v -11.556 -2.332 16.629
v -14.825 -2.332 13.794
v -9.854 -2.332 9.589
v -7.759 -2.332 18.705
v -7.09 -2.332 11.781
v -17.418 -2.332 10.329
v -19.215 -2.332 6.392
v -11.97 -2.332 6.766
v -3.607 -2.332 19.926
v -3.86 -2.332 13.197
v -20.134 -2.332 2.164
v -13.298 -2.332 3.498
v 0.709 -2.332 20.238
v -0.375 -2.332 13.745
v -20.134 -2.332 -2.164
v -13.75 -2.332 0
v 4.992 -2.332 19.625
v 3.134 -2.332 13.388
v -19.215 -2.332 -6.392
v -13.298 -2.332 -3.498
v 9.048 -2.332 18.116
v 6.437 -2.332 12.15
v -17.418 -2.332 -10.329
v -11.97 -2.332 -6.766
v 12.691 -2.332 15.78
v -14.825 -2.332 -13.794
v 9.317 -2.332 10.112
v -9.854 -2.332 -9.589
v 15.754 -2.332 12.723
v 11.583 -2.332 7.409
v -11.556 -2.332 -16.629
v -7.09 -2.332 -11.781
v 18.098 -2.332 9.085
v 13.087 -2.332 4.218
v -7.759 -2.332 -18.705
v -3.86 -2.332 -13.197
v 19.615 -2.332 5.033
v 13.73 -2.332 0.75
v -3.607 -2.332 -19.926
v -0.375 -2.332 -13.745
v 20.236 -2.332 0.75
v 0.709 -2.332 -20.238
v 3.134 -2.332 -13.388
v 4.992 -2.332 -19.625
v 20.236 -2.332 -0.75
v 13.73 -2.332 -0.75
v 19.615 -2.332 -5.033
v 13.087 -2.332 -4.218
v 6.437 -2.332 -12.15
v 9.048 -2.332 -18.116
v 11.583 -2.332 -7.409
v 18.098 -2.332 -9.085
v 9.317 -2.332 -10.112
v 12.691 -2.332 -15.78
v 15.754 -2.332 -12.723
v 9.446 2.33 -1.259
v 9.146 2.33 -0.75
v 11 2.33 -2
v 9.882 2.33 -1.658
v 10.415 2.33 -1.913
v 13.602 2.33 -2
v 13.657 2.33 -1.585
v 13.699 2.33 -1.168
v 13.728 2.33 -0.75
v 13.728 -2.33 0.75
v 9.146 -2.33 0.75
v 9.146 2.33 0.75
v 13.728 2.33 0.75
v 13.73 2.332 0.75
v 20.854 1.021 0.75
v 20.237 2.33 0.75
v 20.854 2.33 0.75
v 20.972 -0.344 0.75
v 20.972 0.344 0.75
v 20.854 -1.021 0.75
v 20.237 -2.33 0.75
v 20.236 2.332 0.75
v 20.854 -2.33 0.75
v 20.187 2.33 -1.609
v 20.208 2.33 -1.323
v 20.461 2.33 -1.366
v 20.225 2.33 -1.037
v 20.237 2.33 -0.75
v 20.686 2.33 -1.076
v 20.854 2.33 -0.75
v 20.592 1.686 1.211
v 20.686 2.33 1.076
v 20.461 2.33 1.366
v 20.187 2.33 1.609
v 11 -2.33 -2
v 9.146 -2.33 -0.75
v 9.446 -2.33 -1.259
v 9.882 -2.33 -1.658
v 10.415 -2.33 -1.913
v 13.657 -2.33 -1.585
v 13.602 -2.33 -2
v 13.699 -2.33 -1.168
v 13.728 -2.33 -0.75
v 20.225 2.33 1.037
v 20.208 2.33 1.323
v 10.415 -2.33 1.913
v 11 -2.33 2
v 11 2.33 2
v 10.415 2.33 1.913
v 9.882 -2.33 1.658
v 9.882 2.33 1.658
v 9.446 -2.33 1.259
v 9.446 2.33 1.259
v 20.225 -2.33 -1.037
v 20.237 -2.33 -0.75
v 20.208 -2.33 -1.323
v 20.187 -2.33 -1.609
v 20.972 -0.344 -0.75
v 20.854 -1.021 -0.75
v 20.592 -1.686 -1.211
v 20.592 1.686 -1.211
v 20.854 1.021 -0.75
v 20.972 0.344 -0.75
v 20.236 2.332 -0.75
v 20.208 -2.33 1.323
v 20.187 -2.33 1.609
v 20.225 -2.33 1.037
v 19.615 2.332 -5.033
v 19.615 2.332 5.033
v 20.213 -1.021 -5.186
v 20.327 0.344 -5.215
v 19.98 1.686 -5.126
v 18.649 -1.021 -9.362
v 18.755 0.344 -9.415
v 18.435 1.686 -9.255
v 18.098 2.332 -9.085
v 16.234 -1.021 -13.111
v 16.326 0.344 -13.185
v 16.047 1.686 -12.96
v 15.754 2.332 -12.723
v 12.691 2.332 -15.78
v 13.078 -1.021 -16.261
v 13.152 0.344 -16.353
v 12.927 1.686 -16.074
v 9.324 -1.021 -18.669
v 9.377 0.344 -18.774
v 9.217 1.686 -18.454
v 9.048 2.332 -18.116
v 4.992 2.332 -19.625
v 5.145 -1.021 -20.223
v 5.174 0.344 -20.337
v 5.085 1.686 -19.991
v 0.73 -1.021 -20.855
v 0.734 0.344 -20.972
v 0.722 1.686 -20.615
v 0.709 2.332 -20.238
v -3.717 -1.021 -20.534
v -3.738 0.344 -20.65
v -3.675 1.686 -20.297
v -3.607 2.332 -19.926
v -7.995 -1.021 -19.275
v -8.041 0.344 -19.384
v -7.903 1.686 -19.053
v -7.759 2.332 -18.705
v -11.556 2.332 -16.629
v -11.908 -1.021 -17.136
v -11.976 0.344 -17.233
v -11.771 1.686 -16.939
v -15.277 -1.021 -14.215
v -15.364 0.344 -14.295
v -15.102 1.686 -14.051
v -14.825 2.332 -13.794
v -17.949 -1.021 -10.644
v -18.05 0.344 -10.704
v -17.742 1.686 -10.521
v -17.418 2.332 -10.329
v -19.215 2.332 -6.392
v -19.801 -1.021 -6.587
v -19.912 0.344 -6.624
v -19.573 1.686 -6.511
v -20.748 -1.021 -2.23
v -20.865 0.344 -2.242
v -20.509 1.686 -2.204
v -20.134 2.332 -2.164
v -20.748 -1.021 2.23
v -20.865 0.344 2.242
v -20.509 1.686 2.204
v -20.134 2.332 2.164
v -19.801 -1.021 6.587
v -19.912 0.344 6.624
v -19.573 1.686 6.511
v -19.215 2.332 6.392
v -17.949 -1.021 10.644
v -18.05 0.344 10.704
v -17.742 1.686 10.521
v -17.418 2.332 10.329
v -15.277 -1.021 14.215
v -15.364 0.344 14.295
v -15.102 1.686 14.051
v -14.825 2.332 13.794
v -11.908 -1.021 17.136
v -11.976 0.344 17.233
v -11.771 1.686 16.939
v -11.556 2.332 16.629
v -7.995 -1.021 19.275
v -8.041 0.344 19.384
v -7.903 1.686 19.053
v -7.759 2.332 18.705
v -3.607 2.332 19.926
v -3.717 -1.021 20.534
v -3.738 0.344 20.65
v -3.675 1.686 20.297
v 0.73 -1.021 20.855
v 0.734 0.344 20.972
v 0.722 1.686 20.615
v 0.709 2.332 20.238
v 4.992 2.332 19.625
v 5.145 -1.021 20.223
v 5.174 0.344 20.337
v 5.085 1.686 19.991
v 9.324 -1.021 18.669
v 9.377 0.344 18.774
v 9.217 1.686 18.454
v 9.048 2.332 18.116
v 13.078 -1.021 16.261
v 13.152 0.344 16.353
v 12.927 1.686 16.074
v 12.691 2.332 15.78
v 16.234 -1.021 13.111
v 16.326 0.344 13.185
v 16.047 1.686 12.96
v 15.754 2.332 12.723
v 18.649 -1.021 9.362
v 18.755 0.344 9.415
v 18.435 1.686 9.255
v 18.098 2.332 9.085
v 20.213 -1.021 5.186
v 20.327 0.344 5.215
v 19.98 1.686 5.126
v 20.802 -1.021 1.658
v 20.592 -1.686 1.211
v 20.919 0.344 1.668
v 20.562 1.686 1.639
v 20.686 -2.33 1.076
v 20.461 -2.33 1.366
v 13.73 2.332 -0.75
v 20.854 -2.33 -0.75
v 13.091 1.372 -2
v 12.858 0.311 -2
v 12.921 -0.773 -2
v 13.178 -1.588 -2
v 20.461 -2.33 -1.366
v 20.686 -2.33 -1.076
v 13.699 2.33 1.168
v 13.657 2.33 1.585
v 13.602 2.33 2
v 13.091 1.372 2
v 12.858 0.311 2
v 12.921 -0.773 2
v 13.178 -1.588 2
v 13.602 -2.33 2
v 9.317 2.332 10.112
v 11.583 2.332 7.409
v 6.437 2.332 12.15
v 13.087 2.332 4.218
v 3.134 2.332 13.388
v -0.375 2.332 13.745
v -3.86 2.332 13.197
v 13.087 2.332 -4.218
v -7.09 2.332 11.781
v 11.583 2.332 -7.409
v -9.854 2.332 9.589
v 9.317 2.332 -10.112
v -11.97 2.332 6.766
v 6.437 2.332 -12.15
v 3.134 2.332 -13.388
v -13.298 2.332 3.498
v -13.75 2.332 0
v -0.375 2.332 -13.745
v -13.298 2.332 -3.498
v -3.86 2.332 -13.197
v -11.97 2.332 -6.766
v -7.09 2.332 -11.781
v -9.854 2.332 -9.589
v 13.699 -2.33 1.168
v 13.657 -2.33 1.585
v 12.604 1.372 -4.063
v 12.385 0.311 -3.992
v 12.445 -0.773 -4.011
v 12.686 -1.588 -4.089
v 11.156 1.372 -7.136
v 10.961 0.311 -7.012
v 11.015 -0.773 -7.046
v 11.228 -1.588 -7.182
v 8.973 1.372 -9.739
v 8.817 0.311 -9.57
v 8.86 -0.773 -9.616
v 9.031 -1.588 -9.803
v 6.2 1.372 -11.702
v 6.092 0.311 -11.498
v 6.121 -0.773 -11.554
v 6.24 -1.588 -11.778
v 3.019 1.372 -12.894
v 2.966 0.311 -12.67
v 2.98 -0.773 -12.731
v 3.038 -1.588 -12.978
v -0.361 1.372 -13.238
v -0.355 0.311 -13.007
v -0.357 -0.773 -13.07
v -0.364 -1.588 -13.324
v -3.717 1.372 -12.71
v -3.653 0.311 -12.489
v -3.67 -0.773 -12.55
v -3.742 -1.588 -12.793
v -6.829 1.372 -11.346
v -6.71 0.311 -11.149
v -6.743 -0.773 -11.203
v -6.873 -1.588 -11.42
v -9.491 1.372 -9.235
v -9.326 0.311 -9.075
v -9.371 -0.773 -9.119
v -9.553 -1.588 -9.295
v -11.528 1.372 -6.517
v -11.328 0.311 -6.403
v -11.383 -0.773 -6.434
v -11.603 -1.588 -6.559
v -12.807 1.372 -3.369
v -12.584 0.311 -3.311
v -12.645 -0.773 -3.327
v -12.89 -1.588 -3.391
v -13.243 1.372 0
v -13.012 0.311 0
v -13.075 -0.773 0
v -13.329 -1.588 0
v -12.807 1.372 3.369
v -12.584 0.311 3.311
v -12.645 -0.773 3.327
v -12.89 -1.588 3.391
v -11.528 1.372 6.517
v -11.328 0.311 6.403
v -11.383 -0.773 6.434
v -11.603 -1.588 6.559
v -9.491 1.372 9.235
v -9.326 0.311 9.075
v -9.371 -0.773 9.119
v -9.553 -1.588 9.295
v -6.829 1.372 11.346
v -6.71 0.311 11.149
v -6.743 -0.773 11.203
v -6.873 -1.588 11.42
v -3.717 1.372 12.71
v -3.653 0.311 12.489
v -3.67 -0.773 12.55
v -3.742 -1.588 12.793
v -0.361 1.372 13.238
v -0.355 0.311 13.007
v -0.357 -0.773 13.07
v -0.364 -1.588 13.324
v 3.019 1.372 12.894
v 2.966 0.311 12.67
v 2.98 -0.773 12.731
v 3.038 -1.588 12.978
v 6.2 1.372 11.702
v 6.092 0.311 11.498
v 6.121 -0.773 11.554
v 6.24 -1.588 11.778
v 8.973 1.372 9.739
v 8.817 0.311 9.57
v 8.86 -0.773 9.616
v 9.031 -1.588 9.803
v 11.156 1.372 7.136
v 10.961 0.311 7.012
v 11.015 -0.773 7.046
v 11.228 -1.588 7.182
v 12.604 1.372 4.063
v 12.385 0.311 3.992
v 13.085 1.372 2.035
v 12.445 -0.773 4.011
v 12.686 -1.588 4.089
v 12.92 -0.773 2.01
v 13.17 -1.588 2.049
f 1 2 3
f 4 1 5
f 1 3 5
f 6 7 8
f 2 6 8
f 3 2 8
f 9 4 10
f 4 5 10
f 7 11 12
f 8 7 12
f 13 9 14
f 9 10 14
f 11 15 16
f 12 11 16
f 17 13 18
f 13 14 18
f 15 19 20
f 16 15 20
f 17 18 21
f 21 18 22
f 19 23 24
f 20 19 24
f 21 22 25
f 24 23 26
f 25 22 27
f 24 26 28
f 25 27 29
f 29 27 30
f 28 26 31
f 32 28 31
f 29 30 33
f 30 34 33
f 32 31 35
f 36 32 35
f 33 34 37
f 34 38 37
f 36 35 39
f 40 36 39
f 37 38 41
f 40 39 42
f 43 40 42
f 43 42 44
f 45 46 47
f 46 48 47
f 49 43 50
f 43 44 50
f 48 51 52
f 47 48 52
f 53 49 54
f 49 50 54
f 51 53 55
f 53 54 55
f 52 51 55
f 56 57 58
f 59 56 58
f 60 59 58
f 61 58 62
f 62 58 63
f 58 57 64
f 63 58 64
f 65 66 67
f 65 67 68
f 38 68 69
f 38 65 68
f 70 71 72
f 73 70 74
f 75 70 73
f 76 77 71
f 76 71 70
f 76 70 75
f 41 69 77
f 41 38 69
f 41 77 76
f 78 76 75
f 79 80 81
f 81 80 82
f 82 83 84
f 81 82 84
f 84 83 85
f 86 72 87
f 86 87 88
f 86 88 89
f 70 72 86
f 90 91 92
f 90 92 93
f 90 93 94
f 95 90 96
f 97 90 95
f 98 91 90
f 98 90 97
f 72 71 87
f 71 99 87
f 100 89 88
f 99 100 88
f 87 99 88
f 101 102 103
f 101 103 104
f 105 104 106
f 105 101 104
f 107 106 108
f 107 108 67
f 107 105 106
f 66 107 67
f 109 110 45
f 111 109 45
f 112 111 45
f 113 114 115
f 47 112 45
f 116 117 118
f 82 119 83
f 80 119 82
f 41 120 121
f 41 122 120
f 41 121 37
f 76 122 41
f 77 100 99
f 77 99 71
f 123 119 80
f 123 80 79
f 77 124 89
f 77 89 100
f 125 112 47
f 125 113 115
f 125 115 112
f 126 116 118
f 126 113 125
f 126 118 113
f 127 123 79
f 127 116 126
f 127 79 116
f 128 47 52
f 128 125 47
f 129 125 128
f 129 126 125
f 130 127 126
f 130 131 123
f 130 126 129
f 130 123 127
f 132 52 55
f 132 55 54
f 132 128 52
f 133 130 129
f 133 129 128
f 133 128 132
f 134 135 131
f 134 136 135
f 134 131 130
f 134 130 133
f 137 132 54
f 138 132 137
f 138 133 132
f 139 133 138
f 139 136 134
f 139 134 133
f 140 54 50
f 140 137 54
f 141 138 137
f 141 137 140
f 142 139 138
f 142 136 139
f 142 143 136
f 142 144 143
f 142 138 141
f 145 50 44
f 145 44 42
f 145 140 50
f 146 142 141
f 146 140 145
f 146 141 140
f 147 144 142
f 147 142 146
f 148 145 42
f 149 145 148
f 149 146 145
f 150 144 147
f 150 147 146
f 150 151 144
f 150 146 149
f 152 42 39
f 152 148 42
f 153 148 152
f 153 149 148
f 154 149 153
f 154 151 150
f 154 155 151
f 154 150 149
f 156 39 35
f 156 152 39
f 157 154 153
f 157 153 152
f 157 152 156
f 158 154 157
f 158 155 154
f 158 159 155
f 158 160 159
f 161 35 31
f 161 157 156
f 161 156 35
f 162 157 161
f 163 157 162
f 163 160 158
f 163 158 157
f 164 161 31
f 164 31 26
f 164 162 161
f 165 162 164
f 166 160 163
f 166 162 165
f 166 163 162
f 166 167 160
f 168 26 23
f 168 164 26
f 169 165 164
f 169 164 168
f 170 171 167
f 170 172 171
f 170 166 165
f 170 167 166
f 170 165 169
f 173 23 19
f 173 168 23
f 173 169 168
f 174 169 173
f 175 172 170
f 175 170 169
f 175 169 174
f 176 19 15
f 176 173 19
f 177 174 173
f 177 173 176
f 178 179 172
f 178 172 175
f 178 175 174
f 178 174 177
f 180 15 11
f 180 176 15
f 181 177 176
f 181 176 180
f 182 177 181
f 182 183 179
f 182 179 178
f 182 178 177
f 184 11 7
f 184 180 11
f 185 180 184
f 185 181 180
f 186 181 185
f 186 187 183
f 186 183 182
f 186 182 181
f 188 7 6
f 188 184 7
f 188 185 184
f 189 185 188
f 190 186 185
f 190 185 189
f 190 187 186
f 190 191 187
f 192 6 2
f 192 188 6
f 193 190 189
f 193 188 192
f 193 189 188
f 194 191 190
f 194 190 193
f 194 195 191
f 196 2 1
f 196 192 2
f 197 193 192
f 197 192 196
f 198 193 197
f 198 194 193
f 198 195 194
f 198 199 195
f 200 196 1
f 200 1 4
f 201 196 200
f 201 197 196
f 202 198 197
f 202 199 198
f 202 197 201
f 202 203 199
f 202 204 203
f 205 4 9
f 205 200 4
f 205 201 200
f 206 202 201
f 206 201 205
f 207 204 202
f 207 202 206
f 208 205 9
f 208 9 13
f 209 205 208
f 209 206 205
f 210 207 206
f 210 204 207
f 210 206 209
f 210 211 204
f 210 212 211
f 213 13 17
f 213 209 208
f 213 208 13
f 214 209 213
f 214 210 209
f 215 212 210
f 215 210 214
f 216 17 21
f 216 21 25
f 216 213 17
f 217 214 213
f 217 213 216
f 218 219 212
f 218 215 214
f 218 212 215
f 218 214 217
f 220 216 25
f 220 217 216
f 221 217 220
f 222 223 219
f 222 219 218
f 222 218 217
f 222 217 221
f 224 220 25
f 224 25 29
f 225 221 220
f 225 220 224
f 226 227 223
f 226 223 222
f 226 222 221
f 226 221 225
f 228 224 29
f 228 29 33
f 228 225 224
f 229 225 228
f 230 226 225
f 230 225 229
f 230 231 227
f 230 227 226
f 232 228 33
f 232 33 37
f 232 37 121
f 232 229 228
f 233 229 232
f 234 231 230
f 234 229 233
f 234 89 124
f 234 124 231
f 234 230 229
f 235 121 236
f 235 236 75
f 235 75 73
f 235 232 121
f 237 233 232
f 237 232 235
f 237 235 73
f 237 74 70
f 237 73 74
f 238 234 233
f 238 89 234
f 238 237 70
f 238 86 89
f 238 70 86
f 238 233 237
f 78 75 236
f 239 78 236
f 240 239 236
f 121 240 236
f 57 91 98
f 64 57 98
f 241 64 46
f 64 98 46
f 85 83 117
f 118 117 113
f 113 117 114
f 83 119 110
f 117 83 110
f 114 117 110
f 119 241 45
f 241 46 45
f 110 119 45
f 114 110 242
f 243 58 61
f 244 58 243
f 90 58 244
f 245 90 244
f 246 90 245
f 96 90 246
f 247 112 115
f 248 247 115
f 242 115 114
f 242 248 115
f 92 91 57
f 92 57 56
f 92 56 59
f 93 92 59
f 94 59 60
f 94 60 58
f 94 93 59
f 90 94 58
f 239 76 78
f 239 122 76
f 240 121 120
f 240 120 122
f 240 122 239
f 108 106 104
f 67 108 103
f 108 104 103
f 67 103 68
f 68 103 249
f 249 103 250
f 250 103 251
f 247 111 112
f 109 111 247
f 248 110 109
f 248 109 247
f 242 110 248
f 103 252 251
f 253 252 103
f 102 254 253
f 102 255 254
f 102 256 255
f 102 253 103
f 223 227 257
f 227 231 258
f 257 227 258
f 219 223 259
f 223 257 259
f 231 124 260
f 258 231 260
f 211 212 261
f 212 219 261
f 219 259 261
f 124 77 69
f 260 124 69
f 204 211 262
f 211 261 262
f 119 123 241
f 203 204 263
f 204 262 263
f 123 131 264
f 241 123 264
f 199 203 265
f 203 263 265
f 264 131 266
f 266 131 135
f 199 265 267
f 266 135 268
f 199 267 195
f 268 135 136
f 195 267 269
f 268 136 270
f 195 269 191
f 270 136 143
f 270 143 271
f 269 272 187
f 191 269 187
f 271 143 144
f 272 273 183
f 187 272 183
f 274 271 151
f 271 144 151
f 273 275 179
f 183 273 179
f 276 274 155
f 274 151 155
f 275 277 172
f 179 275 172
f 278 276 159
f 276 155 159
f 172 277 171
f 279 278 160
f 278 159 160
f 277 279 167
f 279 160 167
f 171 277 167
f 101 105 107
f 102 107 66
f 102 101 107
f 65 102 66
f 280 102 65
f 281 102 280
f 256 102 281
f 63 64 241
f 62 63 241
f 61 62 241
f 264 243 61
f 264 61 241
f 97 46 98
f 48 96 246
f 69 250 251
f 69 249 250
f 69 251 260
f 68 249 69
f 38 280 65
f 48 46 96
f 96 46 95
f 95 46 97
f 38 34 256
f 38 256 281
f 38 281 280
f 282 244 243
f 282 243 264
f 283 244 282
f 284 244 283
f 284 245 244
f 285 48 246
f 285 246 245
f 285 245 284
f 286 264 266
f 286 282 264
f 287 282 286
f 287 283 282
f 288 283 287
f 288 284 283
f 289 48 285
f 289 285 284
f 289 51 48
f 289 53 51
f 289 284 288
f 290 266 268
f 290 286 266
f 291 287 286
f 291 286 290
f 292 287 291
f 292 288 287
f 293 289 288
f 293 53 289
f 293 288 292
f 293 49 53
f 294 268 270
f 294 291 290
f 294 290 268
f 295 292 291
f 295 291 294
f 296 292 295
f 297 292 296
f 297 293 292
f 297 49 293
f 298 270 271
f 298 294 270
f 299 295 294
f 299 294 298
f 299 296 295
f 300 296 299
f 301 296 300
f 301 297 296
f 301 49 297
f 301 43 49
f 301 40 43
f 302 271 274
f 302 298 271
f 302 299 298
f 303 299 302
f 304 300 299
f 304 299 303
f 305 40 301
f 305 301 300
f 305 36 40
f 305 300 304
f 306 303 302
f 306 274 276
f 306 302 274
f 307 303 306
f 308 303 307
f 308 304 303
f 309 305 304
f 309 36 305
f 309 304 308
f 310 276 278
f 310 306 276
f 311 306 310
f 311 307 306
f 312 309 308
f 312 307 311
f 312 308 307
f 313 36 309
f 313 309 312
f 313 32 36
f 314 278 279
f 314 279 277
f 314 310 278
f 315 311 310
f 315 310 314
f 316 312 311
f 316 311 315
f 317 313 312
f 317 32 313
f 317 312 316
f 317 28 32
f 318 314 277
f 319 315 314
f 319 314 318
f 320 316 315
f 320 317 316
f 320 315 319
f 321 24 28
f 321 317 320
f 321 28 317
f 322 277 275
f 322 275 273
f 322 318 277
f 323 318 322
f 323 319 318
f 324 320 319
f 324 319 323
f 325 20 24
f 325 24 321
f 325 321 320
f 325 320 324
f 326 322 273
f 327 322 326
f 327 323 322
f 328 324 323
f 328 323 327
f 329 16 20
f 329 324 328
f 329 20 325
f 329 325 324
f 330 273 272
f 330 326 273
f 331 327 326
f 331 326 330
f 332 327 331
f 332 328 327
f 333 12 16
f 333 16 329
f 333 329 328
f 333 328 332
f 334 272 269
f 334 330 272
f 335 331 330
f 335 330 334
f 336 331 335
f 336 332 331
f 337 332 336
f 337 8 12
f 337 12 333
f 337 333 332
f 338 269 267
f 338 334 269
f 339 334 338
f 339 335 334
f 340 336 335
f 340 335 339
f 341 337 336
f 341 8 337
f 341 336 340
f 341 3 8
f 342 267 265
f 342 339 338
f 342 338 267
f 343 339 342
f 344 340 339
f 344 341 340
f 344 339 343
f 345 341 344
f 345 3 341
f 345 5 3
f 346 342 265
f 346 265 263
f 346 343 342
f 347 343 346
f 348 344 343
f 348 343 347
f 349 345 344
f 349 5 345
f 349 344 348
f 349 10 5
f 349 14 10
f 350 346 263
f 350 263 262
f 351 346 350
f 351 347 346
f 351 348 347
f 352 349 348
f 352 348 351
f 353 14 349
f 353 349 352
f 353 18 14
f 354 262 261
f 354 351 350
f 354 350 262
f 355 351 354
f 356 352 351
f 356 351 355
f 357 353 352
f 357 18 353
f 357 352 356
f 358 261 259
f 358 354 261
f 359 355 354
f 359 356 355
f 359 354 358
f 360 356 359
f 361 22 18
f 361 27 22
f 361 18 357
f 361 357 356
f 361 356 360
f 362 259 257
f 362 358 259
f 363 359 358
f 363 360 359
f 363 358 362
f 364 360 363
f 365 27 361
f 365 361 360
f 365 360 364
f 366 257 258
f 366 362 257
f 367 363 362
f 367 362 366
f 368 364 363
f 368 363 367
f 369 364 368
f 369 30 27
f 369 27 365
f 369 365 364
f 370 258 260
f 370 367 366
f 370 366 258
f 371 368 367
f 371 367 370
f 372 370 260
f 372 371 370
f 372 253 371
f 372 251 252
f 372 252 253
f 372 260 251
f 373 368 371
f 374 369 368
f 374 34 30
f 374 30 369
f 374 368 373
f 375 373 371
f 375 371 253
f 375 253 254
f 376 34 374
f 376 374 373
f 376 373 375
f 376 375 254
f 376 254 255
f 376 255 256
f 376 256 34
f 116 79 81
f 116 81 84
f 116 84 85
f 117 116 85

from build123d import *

# Parameters (mm, degrees)
PAD_DEPTH    = 2.33
SKETCH002_W  = 21.853373
SKETCH002_H  = 1.5
POCKET_DEPTH = 2.5


with BuildPart() as part:
    # Sketch → Revolution (revolve)
    with BuildSketch(Plane.XY):
        with BuildLine():
            ThreePointArc((20.25, -2.331845), (21, 0), (20.25, 2.331845))
            Line((13.75, 2.331845), (20.25, 2.331845))
            ThreePointArc((13.75, 2.331845), (13, 0), (13.75, -2.331845))
            Line((20.25, -2.331845), (13.75, -2.331845))
        make_face()
    revolve(axis=Axis((0, 0, 0), (0, 1, 0)))

    # Sketch001 → Pad (new body, symmetric)
    with BuildSketch(Plane.XZ):
        with BuildLine():
            ThreePointArc((11, 2), (9, 0), (11, -2))
            Line((11, -2), (19, -2))
            ThreePointArc((19, -2), (21, 0), (19, 2))
            Line((19, 2), (11, 2))
        make_face()
    extrude(amount=PAD_DEPTH, both=True)

    # Sketch002 → Pocket (cut, symmetric)
    with BuildSketch(Plane.XZ):
        with Locations((10.926686, 0)):
            Rectangle(SKETCH002_W, SKETCH002_H)
    extrude(amount=POCKET_DEPTH, both=True, mode=Mode.SUBTRACT)


solid = part.part
